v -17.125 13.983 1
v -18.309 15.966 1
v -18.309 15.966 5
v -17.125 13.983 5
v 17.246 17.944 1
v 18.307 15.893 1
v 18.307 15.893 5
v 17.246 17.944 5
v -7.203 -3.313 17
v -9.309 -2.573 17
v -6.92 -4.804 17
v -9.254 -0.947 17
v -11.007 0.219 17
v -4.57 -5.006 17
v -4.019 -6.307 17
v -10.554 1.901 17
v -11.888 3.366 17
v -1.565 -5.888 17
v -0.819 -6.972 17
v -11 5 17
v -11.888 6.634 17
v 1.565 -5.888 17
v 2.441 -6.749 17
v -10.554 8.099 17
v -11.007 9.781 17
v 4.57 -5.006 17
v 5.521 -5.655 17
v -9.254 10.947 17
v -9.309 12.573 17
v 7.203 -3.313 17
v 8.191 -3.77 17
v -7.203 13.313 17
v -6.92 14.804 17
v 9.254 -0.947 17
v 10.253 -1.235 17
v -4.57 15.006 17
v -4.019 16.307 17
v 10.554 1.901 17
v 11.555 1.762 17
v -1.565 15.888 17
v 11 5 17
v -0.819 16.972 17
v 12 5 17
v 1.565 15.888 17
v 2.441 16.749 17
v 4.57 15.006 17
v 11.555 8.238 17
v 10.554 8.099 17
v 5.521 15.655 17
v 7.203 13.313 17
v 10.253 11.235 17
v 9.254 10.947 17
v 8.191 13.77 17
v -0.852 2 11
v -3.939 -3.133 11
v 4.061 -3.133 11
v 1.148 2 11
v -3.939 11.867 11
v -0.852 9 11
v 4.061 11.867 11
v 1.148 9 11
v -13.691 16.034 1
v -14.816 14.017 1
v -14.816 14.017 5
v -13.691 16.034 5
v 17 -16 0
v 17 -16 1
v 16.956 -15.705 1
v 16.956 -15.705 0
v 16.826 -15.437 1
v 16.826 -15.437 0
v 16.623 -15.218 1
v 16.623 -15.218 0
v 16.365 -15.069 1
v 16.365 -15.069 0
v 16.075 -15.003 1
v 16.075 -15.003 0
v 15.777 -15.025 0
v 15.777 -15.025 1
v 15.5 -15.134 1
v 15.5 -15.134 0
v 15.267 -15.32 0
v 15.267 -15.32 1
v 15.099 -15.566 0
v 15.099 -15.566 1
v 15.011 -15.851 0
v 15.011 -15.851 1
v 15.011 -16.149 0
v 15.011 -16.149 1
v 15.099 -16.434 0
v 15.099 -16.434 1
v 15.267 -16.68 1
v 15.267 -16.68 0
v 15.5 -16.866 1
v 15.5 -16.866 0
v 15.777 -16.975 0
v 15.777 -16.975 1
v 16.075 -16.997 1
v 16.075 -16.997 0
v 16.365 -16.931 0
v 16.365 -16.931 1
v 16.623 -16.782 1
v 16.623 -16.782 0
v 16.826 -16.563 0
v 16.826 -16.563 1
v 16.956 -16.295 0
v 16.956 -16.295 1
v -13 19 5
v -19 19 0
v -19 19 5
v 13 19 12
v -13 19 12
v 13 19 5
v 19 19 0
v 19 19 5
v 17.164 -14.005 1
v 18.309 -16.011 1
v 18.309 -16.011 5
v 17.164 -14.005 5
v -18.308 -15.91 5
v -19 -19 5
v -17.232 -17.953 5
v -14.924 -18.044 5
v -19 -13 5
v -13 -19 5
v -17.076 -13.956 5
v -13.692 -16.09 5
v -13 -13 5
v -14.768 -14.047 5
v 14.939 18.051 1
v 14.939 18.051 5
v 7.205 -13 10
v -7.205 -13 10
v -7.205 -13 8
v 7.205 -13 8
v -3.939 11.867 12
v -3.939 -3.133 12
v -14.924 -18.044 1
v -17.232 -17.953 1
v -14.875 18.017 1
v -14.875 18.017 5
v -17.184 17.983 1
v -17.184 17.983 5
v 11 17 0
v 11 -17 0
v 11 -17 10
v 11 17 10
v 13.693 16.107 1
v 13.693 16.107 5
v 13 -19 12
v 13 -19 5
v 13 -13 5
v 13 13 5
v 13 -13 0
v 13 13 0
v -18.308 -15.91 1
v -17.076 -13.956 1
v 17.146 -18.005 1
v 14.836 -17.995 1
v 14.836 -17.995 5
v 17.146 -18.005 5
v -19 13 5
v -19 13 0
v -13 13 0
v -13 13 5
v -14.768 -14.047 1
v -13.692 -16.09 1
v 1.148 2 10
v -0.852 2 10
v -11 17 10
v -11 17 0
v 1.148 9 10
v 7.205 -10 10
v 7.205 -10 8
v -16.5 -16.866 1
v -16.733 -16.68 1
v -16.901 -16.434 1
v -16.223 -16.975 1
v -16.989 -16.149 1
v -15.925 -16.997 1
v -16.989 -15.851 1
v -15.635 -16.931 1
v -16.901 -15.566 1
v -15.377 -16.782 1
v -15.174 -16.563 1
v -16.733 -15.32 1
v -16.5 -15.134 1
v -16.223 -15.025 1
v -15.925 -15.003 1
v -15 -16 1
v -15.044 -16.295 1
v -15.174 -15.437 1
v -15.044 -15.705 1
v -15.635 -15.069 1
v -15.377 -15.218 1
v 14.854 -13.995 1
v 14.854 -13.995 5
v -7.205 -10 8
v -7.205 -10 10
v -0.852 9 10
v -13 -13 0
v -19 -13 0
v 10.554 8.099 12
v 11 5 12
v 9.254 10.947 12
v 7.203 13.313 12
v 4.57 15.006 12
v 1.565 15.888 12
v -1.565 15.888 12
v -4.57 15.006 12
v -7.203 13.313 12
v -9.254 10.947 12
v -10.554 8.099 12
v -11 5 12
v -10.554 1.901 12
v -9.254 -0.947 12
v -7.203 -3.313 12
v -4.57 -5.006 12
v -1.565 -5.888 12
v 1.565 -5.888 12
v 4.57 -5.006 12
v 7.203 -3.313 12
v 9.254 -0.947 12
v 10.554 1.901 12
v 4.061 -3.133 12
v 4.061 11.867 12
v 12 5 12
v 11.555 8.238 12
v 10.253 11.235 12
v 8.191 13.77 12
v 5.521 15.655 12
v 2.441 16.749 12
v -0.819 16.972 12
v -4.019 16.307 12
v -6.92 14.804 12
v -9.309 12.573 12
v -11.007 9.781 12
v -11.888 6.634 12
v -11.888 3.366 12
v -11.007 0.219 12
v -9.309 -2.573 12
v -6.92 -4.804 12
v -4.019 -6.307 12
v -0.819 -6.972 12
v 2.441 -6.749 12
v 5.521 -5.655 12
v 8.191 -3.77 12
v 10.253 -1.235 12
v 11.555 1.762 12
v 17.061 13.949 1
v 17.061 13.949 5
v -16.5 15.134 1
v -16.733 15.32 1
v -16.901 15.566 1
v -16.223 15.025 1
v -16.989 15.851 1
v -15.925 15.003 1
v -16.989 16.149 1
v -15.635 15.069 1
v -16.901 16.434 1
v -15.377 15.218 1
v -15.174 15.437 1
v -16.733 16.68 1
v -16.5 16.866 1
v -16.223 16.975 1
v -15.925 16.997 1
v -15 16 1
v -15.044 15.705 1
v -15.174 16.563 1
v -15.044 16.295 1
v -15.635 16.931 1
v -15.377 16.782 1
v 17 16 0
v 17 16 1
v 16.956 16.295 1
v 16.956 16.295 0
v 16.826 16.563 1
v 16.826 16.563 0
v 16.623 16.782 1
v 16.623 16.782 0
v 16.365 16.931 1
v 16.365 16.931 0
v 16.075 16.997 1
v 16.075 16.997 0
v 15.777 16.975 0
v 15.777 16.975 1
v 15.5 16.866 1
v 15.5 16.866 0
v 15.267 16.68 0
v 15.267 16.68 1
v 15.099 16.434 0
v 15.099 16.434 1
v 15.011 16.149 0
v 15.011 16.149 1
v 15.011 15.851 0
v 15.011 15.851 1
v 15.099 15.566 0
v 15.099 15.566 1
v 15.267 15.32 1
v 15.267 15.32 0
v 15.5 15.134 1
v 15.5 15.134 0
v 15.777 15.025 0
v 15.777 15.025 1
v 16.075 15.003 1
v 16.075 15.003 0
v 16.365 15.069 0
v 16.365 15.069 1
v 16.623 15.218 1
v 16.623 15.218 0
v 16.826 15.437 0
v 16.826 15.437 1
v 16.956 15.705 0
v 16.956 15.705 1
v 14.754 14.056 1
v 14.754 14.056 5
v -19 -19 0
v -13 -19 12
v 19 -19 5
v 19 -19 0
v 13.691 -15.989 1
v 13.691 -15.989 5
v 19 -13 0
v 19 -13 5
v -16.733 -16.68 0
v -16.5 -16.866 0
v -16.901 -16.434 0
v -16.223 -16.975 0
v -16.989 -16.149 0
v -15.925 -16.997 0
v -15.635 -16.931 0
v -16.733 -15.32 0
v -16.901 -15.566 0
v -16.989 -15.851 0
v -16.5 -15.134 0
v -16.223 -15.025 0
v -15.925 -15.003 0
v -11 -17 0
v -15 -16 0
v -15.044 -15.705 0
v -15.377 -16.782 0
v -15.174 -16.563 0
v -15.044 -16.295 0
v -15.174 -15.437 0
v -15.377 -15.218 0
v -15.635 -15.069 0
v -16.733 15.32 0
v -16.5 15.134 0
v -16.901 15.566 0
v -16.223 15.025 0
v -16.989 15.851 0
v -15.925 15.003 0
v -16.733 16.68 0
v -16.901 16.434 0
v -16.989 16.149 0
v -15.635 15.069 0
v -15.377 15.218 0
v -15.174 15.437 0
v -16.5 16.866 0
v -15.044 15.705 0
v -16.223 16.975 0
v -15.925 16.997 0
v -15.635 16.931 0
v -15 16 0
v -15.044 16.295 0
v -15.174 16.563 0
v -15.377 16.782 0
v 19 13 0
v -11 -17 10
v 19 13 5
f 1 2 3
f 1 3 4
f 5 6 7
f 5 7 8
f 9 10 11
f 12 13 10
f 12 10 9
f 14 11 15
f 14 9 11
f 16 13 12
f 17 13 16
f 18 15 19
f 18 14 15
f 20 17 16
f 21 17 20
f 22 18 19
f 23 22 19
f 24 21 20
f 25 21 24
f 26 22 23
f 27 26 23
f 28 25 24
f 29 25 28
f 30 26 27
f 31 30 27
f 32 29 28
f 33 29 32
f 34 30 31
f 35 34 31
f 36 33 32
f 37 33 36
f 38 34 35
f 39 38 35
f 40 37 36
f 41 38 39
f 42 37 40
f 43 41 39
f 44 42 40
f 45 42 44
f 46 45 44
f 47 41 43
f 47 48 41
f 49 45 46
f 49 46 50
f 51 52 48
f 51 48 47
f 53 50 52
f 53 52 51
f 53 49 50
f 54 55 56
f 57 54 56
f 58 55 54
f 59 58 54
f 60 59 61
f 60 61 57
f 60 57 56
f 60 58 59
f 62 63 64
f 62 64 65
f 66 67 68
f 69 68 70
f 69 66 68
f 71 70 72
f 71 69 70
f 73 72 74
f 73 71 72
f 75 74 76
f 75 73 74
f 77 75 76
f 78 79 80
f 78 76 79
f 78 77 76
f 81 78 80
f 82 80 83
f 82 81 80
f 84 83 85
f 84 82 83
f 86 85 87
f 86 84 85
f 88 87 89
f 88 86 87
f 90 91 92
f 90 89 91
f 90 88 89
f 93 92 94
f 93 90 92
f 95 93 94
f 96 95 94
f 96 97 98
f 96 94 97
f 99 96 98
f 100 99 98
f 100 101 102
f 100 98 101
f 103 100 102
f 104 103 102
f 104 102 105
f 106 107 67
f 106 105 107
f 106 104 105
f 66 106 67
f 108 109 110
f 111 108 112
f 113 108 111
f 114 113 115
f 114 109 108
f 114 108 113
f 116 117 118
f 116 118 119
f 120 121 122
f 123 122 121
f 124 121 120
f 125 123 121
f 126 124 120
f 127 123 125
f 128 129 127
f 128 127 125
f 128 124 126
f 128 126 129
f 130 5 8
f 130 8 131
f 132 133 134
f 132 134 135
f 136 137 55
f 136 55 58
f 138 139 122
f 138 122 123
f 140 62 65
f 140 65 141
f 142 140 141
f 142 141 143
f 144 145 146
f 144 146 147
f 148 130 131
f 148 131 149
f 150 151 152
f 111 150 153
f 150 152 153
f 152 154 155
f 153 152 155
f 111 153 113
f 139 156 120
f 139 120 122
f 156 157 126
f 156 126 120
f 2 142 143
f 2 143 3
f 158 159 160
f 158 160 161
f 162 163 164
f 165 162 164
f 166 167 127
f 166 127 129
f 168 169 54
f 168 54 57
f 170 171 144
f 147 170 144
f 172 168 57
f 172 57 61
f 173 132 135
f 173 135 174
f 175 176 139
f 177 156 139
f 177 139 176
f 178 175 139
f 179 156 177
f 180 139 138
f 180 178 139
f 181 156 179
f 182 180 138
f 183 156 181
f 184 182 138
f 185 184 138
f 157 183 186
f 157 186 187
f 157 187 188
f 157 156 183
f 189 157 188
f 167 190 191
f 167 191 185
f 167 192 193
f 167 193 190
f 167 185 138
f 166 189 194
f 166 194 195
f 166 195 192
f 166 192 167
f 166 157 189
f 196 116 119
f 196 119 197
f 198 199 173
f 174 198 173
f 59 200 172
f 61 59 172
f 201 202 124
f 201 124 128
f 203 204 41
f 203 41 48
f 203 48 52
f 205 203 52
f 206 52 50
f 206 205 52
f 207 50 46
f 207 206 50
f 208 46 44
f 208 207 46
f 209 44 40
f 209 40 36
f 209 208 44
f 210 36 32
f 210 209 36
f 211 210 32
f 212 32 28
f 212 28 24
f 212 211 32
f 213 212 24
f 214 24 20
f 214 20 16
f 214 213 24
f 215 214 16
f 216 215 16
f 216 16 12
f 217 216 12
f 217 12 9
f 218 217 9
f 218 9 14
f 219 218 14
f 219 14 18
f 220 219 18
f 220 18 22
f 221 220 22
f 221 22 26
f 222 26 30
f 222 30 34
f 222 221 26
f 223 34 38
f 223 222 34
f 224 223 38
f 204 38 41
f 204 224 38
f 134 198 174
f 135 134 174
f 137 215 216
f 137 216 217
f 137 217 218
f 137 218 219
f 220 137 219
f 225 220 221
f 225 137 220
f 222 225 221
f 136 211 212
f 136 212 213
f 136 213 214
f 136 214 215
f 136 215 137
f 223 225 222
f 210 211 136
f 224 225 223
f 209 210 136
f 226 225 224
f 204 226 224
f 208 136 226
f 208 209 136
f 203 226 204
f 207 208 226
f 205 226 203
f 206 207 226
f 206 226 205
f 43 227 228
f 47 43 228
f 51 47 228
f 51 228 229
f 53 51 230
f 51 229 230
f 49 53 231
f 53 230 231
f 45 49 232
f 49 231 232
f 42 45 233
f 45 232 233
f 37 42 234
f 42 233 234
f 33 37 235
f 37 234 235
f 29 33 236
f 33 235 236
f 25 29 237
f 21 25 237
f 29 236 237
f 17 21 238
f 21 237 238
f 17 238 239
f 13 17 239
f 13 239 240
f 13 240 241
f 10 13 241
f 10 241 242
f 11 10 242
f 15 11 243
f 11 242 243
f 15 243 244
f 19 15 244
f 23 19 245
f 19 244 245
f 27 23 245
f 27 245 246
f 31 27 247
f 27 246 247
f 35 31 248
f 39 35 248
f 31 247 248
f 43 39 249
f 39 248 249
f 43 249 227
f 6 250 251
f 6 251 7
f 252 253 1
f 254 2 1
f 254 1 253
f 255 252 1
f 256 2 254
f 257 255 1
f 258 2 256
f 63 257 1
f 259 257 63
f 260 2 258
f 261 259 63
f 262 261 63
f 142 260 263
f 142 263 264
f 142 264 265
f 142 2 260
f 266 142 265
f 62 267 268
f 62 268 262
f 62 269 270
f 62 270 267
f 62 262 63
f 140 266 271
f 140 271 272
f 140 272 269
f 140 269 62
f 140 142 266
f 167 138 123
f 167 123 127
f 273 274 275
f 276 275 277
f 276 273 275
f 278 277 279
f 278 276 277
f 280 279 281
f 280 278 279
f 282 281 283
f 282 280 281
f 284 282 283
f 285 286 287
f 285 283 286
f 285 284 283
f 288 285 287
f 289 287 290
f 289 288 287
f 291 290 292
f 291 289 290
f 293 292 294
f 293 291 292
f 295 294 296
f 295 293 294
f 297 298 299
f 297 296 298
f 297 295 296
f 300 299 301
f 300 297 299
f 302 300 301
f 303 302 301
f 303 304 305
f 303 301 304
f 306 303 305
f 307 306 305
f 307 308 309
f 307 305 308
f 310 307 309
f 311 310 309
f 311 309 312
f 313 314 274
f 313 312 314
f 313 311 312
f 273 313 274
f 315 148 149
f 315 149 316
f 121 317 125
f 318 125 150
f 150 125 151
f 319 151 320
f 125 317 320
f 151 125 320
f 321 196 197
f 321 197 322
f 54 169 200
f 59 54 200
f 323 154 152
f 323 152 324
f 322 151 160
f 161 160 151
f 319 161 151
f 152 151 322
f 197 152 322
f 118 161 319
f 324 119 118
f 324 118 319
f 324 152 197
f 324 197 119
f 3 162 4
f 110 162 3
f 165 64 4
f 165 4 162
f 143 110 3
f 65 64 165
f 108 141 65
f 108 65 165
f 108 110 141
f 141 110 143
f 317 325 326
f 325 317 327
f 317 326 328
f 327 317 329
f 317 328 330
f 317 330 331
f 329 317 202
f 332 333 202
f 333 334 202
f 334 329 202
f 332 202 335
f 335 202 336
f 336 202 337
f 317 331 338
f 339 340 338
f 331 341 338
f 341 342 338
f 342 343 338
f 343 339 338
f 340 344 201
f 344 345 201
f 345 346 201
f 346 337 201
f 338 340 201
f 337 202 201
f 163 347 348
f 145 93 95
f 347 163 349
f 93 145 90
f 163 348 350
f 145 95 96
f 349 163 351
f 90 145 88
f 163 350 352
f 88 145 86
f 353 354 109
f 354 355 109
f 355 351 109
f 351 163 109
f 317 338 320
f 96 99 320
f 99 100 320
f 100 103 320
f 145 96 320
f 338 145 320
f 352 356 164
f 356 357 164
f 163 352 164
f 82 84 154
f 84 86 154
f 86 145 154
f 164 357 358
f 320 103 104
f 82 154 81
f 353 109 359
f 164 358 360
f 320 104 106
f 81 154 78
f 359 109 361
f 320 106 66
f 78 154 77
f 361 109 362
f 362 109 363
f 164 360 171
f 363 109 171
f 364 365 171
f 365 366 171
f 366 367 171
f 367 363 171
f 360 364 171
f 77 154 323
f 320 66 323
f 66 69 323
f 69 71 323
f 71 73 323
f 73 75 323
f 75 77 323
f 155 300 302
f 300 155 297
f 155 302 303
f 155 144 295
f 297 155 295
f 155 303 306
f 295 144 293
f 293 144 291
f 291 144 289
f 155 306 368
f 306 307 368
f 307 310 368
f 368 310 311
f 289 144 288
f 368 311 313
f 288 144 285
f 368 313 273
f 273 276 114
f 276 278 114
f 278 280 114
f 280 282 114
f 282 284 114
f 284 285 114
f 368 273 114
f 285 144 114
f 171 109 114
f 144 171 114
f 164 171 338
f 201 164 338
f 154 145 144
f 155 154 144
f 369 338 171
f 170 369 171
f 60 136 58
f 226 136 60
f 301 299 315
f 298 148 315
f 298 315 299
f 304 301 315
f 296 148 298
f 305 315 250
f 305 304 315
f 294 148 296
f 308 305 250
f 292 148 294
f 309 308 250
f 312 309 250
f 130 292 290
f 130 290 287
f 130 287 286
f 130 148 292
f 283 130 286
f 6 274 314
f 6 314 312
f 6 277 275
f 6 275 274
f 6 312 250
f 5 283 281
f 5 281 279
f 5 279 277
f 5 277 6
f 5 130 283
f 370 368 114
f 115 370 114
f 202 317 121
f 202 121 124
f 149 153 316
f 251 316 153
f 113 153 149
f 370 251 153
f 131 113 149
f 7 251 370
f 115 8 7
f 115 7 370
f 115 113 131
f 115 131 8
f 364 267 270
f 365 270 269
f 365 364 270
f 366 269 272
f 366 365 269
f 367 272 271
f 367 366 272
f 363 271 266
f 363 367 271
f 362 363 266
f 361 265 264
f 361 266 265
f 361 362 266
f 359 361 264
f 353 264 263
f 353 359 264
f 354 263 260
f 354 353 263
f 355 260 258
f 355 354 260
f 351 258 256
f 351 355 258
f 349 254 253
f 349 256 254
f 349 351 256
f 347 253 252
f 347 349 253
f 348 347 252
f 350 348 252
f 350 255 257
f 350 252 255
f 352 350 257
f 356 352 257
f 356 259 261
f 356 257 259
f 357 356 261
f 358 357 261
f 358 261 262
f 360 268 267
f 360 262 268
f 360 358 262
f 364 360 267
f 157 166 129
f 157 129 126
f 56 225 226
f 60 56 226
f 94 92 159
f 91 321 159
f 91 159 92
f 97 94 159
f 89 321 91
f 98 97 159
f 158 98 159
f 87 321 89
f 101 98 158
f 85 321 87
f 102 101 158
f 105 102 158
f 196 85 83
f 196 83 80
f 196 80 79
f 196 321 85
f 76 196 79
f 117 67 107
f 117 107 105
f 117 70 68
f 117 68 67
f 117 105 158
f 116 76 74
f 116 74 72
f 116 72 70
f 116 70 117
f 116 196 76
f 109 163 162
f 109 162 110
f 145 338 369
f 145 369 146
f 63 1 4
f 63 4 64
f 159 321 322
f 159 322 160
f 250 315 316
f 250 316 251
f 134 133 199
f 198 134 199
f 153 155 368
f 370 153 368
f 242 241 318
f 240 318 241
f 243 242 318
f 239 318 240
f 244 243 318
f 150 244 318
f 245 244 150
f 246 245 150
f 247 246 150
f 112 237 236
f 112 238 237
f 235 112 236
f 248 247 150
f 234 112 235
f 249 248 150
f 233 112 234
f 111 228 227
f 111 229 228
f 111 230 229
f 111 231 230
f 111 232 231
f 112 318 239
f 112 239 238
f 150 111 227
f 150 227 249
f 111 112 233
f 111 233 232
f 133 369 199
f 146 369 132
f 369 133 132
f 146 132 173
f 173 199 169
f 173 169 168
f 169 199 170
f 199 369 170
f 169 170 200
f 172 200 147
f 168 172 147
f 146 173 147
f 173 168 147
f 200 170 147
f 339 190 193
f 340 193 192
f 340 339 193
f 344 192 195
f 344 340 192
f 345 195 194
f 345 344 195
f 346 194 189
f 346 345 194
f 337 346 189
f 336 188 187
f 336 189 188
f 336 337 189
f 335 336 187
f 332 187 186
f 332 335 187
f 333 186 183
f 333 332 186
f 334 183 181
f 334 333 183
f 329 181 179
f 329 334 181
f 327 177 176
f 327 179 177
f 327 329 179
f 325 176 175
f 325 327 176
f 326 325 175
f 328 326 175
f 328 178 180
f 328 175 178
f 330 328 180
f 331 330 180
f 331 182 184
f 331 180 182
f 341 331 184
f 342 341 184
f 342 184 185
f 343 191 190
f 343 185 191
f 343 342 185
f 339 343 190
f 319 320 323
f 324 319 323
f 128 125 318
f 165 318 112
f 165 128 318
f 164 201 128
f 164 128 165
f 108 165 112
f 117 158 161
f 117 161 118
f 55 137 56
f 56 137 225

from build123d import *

# Parameters (mm, degrees)
SKETCH_1_W          = 26
SKETCH_1_H          = 38
EXTRUDE_1_DEPTH     = 12
SKETCH_2_W          = 22
SKETCH_2_H          = 34
CUT_EXTRUDE_1_DEPTH = 10
SKETCH_3_W          = 2
SKETCH_3_H          = 7
CUT_EXTRUDE_3_DEPTH = 12
SKETCH_4_W          = 6
SKETCH_4_H          = 6
EXTRUDE_2_DEPTH     = 5
SKETCH_5_R          = 1
CUT_EXTRUDE_4_DEPTH = 13
CUT_EXTRUDE_START   = 1
CUT_EXTRUDE_5_DEPTH = 4
SKETCH_7_R          = 12
SKETCH_7_R_2        = 11
EXTRUDE_3_DEPTH     = 5
SKETCH_9_W          = 8
SKETCH_9_H          = 15
CUT_EXTRUDE_7_DEPTH = 1
SKETCH_10_W         = 14.41096837
SKETCH_10_H         = 3
EXTRUDE_4_DEPTH     = 2


with BuildPart() as part:
    # ｽｹｯﾁ1 → ﾎﾞｽ - 押し出し1 (new body)
    with BuildSketch(Plane.XY):
        Rectangle(SKETCH_1_W, SKETCH_1_H)
    extrude(amount=EXTRUDE_1_DEPTH)

    # ｽｹｯﾁ2 → ｶｯﾄ - 押し出し1 (cut)
    with BuildSketch(Plane.XY):
        Rectangle(SKETCH_2_W, SKETCH_2_H)
    extrude(amount=CUT_EXTRUDE_1_DEPTH, mode=Mode.SUBTRACT)

    # ｽｹｯﾁ3 → ｶｯﾄ - 押し出し3 (cut)
    with BuildSketch(Plane.XY):
        with Locations((0.147807357, 5.5)):
            Rectangle(SKETCH_3_W, SKETCH_3_H)
    extrude(amount=CUT_EXTRUDE_3_DEPTH, mode=Mode.SUBTRACT)

    # ｽｹｯﾁ4 → ﾎﾞｽ - 押し出し2 (add)
    with BuildSketch(Plane.XY):
        with Locations((16, 16)):
            Rectangle(SKETCH_4_W, SKETCH_4_H)
        with Locations((16, -16)):
            Rectangle(SKETCH_4_W, SKETCH_4_H)
        with Locations((-16, -16)):
            Rectangle(SKETCH_4_W, SKETCH_4_H)
        with Locations((-16, 16)):
            Rectangle(SKETCH_4_W, SKETCH_4_H)
    extrude(amount=EXTRUDE_2_DEPTH)

    # ｽｹｯﾁ5 → ｶｯﾄ - 押し出し4 (cut, through all)
    with BuildSketch(Plane.XY):
        with Locations((-16, 16)):
            Circle(SKETCH_5_R)
        with Locations((-16, -16)):
            Circle(SKETCH_5_R)
        with Locations((16, -16)):
            Circle(SKETCH_5_R)
        with Locations((16, 16)):
            Circle(SKETCH_5_R)
    extrude(amount=CUT_EXTRUDE_4_DEPTH, mode=Mode.SUBTRACT)

    # ｽｹｯﾁ6 → ｶｯﾄ - 押し出し5 (cut)
    with BuildSketch(Plane.XY.offset(CUT_EXTRUDE_START)):
        Polygon((-17.184124892, 17.98272075), (-18.309148984, 15.965878137), (-17.125024092, 13.983157387), (-14.815875108, 14.01727925), (-13.690851016, 16.034121863), (-14.874975908, 18.016842613), align=None)
        Polygon((-17.07560545, -13.956374239), (-18.307634549, -15.909688764), (-17.2320291, -17.953314524), (-14.92439455, -18.043625761), (-13.692365451, -16.090311236), (-14.7679709, -14.046685476), align=None)
        Polygon((14.939341307, 18.051423035), (13.693086191, 16.107154145), (14.753744884, 14.055731109), (17.060658693, 13.948576965), (18.306913809, 15.892845855), (17.246255116, 17.944268891), align=None)
        Polygon((14.854466591, -13.994735294), (13.690623119, -15.98942868), (14.836156527, -17.994693386), (17.145533409, -18.005264706), (18.309376881, -16.01057132), (17.163843473, -14.005306614), align=None)
    extrude(amount=CUT_EXTRUDE_5_DEPTH, mode=Mode.SUBTRACT)

    # ｽｹｯﾁ7 → ﾎﾞｽ - 押し出し3 (add)
    with BuildSketch(Plane.XY.offset(12)):
        with Locations((0, 5)):
            Circle(SKETCH_7_R)
        with Locations((0, 5)):
            Circle(SKETCH_7_R_2, mode=Mode.SUBTRACT)
    extrude(amount=EXTRUDE_3_DEPTH)

    # ｽｹｯﾁ9 → ｶｯﾄ - 押し出し7 (cut)
    with BuildSketch(Plane.XY.offset(12)):
        with Locations((0.061272904, 4.367214105)):
            Rectangle(SKETCH_9_W, SKETCH_9_H)
    extrude(amount=-CUT_EXTRUDE_7_DEPTH, mode=Mode.SUBTRACT)

    # ｽｹｯﾁ10 → ﾎﾞｽ - 押し出し4 (add)
    with BuildSketch(Plane.XY.offset(10)):
        with Locations((0, -11.5)):
            Rectangle(SKETCH_10_W, SKETCH_10_H)
    extrude(amount=-EXTRUDE_4_DEPTH)


solid = part.part
